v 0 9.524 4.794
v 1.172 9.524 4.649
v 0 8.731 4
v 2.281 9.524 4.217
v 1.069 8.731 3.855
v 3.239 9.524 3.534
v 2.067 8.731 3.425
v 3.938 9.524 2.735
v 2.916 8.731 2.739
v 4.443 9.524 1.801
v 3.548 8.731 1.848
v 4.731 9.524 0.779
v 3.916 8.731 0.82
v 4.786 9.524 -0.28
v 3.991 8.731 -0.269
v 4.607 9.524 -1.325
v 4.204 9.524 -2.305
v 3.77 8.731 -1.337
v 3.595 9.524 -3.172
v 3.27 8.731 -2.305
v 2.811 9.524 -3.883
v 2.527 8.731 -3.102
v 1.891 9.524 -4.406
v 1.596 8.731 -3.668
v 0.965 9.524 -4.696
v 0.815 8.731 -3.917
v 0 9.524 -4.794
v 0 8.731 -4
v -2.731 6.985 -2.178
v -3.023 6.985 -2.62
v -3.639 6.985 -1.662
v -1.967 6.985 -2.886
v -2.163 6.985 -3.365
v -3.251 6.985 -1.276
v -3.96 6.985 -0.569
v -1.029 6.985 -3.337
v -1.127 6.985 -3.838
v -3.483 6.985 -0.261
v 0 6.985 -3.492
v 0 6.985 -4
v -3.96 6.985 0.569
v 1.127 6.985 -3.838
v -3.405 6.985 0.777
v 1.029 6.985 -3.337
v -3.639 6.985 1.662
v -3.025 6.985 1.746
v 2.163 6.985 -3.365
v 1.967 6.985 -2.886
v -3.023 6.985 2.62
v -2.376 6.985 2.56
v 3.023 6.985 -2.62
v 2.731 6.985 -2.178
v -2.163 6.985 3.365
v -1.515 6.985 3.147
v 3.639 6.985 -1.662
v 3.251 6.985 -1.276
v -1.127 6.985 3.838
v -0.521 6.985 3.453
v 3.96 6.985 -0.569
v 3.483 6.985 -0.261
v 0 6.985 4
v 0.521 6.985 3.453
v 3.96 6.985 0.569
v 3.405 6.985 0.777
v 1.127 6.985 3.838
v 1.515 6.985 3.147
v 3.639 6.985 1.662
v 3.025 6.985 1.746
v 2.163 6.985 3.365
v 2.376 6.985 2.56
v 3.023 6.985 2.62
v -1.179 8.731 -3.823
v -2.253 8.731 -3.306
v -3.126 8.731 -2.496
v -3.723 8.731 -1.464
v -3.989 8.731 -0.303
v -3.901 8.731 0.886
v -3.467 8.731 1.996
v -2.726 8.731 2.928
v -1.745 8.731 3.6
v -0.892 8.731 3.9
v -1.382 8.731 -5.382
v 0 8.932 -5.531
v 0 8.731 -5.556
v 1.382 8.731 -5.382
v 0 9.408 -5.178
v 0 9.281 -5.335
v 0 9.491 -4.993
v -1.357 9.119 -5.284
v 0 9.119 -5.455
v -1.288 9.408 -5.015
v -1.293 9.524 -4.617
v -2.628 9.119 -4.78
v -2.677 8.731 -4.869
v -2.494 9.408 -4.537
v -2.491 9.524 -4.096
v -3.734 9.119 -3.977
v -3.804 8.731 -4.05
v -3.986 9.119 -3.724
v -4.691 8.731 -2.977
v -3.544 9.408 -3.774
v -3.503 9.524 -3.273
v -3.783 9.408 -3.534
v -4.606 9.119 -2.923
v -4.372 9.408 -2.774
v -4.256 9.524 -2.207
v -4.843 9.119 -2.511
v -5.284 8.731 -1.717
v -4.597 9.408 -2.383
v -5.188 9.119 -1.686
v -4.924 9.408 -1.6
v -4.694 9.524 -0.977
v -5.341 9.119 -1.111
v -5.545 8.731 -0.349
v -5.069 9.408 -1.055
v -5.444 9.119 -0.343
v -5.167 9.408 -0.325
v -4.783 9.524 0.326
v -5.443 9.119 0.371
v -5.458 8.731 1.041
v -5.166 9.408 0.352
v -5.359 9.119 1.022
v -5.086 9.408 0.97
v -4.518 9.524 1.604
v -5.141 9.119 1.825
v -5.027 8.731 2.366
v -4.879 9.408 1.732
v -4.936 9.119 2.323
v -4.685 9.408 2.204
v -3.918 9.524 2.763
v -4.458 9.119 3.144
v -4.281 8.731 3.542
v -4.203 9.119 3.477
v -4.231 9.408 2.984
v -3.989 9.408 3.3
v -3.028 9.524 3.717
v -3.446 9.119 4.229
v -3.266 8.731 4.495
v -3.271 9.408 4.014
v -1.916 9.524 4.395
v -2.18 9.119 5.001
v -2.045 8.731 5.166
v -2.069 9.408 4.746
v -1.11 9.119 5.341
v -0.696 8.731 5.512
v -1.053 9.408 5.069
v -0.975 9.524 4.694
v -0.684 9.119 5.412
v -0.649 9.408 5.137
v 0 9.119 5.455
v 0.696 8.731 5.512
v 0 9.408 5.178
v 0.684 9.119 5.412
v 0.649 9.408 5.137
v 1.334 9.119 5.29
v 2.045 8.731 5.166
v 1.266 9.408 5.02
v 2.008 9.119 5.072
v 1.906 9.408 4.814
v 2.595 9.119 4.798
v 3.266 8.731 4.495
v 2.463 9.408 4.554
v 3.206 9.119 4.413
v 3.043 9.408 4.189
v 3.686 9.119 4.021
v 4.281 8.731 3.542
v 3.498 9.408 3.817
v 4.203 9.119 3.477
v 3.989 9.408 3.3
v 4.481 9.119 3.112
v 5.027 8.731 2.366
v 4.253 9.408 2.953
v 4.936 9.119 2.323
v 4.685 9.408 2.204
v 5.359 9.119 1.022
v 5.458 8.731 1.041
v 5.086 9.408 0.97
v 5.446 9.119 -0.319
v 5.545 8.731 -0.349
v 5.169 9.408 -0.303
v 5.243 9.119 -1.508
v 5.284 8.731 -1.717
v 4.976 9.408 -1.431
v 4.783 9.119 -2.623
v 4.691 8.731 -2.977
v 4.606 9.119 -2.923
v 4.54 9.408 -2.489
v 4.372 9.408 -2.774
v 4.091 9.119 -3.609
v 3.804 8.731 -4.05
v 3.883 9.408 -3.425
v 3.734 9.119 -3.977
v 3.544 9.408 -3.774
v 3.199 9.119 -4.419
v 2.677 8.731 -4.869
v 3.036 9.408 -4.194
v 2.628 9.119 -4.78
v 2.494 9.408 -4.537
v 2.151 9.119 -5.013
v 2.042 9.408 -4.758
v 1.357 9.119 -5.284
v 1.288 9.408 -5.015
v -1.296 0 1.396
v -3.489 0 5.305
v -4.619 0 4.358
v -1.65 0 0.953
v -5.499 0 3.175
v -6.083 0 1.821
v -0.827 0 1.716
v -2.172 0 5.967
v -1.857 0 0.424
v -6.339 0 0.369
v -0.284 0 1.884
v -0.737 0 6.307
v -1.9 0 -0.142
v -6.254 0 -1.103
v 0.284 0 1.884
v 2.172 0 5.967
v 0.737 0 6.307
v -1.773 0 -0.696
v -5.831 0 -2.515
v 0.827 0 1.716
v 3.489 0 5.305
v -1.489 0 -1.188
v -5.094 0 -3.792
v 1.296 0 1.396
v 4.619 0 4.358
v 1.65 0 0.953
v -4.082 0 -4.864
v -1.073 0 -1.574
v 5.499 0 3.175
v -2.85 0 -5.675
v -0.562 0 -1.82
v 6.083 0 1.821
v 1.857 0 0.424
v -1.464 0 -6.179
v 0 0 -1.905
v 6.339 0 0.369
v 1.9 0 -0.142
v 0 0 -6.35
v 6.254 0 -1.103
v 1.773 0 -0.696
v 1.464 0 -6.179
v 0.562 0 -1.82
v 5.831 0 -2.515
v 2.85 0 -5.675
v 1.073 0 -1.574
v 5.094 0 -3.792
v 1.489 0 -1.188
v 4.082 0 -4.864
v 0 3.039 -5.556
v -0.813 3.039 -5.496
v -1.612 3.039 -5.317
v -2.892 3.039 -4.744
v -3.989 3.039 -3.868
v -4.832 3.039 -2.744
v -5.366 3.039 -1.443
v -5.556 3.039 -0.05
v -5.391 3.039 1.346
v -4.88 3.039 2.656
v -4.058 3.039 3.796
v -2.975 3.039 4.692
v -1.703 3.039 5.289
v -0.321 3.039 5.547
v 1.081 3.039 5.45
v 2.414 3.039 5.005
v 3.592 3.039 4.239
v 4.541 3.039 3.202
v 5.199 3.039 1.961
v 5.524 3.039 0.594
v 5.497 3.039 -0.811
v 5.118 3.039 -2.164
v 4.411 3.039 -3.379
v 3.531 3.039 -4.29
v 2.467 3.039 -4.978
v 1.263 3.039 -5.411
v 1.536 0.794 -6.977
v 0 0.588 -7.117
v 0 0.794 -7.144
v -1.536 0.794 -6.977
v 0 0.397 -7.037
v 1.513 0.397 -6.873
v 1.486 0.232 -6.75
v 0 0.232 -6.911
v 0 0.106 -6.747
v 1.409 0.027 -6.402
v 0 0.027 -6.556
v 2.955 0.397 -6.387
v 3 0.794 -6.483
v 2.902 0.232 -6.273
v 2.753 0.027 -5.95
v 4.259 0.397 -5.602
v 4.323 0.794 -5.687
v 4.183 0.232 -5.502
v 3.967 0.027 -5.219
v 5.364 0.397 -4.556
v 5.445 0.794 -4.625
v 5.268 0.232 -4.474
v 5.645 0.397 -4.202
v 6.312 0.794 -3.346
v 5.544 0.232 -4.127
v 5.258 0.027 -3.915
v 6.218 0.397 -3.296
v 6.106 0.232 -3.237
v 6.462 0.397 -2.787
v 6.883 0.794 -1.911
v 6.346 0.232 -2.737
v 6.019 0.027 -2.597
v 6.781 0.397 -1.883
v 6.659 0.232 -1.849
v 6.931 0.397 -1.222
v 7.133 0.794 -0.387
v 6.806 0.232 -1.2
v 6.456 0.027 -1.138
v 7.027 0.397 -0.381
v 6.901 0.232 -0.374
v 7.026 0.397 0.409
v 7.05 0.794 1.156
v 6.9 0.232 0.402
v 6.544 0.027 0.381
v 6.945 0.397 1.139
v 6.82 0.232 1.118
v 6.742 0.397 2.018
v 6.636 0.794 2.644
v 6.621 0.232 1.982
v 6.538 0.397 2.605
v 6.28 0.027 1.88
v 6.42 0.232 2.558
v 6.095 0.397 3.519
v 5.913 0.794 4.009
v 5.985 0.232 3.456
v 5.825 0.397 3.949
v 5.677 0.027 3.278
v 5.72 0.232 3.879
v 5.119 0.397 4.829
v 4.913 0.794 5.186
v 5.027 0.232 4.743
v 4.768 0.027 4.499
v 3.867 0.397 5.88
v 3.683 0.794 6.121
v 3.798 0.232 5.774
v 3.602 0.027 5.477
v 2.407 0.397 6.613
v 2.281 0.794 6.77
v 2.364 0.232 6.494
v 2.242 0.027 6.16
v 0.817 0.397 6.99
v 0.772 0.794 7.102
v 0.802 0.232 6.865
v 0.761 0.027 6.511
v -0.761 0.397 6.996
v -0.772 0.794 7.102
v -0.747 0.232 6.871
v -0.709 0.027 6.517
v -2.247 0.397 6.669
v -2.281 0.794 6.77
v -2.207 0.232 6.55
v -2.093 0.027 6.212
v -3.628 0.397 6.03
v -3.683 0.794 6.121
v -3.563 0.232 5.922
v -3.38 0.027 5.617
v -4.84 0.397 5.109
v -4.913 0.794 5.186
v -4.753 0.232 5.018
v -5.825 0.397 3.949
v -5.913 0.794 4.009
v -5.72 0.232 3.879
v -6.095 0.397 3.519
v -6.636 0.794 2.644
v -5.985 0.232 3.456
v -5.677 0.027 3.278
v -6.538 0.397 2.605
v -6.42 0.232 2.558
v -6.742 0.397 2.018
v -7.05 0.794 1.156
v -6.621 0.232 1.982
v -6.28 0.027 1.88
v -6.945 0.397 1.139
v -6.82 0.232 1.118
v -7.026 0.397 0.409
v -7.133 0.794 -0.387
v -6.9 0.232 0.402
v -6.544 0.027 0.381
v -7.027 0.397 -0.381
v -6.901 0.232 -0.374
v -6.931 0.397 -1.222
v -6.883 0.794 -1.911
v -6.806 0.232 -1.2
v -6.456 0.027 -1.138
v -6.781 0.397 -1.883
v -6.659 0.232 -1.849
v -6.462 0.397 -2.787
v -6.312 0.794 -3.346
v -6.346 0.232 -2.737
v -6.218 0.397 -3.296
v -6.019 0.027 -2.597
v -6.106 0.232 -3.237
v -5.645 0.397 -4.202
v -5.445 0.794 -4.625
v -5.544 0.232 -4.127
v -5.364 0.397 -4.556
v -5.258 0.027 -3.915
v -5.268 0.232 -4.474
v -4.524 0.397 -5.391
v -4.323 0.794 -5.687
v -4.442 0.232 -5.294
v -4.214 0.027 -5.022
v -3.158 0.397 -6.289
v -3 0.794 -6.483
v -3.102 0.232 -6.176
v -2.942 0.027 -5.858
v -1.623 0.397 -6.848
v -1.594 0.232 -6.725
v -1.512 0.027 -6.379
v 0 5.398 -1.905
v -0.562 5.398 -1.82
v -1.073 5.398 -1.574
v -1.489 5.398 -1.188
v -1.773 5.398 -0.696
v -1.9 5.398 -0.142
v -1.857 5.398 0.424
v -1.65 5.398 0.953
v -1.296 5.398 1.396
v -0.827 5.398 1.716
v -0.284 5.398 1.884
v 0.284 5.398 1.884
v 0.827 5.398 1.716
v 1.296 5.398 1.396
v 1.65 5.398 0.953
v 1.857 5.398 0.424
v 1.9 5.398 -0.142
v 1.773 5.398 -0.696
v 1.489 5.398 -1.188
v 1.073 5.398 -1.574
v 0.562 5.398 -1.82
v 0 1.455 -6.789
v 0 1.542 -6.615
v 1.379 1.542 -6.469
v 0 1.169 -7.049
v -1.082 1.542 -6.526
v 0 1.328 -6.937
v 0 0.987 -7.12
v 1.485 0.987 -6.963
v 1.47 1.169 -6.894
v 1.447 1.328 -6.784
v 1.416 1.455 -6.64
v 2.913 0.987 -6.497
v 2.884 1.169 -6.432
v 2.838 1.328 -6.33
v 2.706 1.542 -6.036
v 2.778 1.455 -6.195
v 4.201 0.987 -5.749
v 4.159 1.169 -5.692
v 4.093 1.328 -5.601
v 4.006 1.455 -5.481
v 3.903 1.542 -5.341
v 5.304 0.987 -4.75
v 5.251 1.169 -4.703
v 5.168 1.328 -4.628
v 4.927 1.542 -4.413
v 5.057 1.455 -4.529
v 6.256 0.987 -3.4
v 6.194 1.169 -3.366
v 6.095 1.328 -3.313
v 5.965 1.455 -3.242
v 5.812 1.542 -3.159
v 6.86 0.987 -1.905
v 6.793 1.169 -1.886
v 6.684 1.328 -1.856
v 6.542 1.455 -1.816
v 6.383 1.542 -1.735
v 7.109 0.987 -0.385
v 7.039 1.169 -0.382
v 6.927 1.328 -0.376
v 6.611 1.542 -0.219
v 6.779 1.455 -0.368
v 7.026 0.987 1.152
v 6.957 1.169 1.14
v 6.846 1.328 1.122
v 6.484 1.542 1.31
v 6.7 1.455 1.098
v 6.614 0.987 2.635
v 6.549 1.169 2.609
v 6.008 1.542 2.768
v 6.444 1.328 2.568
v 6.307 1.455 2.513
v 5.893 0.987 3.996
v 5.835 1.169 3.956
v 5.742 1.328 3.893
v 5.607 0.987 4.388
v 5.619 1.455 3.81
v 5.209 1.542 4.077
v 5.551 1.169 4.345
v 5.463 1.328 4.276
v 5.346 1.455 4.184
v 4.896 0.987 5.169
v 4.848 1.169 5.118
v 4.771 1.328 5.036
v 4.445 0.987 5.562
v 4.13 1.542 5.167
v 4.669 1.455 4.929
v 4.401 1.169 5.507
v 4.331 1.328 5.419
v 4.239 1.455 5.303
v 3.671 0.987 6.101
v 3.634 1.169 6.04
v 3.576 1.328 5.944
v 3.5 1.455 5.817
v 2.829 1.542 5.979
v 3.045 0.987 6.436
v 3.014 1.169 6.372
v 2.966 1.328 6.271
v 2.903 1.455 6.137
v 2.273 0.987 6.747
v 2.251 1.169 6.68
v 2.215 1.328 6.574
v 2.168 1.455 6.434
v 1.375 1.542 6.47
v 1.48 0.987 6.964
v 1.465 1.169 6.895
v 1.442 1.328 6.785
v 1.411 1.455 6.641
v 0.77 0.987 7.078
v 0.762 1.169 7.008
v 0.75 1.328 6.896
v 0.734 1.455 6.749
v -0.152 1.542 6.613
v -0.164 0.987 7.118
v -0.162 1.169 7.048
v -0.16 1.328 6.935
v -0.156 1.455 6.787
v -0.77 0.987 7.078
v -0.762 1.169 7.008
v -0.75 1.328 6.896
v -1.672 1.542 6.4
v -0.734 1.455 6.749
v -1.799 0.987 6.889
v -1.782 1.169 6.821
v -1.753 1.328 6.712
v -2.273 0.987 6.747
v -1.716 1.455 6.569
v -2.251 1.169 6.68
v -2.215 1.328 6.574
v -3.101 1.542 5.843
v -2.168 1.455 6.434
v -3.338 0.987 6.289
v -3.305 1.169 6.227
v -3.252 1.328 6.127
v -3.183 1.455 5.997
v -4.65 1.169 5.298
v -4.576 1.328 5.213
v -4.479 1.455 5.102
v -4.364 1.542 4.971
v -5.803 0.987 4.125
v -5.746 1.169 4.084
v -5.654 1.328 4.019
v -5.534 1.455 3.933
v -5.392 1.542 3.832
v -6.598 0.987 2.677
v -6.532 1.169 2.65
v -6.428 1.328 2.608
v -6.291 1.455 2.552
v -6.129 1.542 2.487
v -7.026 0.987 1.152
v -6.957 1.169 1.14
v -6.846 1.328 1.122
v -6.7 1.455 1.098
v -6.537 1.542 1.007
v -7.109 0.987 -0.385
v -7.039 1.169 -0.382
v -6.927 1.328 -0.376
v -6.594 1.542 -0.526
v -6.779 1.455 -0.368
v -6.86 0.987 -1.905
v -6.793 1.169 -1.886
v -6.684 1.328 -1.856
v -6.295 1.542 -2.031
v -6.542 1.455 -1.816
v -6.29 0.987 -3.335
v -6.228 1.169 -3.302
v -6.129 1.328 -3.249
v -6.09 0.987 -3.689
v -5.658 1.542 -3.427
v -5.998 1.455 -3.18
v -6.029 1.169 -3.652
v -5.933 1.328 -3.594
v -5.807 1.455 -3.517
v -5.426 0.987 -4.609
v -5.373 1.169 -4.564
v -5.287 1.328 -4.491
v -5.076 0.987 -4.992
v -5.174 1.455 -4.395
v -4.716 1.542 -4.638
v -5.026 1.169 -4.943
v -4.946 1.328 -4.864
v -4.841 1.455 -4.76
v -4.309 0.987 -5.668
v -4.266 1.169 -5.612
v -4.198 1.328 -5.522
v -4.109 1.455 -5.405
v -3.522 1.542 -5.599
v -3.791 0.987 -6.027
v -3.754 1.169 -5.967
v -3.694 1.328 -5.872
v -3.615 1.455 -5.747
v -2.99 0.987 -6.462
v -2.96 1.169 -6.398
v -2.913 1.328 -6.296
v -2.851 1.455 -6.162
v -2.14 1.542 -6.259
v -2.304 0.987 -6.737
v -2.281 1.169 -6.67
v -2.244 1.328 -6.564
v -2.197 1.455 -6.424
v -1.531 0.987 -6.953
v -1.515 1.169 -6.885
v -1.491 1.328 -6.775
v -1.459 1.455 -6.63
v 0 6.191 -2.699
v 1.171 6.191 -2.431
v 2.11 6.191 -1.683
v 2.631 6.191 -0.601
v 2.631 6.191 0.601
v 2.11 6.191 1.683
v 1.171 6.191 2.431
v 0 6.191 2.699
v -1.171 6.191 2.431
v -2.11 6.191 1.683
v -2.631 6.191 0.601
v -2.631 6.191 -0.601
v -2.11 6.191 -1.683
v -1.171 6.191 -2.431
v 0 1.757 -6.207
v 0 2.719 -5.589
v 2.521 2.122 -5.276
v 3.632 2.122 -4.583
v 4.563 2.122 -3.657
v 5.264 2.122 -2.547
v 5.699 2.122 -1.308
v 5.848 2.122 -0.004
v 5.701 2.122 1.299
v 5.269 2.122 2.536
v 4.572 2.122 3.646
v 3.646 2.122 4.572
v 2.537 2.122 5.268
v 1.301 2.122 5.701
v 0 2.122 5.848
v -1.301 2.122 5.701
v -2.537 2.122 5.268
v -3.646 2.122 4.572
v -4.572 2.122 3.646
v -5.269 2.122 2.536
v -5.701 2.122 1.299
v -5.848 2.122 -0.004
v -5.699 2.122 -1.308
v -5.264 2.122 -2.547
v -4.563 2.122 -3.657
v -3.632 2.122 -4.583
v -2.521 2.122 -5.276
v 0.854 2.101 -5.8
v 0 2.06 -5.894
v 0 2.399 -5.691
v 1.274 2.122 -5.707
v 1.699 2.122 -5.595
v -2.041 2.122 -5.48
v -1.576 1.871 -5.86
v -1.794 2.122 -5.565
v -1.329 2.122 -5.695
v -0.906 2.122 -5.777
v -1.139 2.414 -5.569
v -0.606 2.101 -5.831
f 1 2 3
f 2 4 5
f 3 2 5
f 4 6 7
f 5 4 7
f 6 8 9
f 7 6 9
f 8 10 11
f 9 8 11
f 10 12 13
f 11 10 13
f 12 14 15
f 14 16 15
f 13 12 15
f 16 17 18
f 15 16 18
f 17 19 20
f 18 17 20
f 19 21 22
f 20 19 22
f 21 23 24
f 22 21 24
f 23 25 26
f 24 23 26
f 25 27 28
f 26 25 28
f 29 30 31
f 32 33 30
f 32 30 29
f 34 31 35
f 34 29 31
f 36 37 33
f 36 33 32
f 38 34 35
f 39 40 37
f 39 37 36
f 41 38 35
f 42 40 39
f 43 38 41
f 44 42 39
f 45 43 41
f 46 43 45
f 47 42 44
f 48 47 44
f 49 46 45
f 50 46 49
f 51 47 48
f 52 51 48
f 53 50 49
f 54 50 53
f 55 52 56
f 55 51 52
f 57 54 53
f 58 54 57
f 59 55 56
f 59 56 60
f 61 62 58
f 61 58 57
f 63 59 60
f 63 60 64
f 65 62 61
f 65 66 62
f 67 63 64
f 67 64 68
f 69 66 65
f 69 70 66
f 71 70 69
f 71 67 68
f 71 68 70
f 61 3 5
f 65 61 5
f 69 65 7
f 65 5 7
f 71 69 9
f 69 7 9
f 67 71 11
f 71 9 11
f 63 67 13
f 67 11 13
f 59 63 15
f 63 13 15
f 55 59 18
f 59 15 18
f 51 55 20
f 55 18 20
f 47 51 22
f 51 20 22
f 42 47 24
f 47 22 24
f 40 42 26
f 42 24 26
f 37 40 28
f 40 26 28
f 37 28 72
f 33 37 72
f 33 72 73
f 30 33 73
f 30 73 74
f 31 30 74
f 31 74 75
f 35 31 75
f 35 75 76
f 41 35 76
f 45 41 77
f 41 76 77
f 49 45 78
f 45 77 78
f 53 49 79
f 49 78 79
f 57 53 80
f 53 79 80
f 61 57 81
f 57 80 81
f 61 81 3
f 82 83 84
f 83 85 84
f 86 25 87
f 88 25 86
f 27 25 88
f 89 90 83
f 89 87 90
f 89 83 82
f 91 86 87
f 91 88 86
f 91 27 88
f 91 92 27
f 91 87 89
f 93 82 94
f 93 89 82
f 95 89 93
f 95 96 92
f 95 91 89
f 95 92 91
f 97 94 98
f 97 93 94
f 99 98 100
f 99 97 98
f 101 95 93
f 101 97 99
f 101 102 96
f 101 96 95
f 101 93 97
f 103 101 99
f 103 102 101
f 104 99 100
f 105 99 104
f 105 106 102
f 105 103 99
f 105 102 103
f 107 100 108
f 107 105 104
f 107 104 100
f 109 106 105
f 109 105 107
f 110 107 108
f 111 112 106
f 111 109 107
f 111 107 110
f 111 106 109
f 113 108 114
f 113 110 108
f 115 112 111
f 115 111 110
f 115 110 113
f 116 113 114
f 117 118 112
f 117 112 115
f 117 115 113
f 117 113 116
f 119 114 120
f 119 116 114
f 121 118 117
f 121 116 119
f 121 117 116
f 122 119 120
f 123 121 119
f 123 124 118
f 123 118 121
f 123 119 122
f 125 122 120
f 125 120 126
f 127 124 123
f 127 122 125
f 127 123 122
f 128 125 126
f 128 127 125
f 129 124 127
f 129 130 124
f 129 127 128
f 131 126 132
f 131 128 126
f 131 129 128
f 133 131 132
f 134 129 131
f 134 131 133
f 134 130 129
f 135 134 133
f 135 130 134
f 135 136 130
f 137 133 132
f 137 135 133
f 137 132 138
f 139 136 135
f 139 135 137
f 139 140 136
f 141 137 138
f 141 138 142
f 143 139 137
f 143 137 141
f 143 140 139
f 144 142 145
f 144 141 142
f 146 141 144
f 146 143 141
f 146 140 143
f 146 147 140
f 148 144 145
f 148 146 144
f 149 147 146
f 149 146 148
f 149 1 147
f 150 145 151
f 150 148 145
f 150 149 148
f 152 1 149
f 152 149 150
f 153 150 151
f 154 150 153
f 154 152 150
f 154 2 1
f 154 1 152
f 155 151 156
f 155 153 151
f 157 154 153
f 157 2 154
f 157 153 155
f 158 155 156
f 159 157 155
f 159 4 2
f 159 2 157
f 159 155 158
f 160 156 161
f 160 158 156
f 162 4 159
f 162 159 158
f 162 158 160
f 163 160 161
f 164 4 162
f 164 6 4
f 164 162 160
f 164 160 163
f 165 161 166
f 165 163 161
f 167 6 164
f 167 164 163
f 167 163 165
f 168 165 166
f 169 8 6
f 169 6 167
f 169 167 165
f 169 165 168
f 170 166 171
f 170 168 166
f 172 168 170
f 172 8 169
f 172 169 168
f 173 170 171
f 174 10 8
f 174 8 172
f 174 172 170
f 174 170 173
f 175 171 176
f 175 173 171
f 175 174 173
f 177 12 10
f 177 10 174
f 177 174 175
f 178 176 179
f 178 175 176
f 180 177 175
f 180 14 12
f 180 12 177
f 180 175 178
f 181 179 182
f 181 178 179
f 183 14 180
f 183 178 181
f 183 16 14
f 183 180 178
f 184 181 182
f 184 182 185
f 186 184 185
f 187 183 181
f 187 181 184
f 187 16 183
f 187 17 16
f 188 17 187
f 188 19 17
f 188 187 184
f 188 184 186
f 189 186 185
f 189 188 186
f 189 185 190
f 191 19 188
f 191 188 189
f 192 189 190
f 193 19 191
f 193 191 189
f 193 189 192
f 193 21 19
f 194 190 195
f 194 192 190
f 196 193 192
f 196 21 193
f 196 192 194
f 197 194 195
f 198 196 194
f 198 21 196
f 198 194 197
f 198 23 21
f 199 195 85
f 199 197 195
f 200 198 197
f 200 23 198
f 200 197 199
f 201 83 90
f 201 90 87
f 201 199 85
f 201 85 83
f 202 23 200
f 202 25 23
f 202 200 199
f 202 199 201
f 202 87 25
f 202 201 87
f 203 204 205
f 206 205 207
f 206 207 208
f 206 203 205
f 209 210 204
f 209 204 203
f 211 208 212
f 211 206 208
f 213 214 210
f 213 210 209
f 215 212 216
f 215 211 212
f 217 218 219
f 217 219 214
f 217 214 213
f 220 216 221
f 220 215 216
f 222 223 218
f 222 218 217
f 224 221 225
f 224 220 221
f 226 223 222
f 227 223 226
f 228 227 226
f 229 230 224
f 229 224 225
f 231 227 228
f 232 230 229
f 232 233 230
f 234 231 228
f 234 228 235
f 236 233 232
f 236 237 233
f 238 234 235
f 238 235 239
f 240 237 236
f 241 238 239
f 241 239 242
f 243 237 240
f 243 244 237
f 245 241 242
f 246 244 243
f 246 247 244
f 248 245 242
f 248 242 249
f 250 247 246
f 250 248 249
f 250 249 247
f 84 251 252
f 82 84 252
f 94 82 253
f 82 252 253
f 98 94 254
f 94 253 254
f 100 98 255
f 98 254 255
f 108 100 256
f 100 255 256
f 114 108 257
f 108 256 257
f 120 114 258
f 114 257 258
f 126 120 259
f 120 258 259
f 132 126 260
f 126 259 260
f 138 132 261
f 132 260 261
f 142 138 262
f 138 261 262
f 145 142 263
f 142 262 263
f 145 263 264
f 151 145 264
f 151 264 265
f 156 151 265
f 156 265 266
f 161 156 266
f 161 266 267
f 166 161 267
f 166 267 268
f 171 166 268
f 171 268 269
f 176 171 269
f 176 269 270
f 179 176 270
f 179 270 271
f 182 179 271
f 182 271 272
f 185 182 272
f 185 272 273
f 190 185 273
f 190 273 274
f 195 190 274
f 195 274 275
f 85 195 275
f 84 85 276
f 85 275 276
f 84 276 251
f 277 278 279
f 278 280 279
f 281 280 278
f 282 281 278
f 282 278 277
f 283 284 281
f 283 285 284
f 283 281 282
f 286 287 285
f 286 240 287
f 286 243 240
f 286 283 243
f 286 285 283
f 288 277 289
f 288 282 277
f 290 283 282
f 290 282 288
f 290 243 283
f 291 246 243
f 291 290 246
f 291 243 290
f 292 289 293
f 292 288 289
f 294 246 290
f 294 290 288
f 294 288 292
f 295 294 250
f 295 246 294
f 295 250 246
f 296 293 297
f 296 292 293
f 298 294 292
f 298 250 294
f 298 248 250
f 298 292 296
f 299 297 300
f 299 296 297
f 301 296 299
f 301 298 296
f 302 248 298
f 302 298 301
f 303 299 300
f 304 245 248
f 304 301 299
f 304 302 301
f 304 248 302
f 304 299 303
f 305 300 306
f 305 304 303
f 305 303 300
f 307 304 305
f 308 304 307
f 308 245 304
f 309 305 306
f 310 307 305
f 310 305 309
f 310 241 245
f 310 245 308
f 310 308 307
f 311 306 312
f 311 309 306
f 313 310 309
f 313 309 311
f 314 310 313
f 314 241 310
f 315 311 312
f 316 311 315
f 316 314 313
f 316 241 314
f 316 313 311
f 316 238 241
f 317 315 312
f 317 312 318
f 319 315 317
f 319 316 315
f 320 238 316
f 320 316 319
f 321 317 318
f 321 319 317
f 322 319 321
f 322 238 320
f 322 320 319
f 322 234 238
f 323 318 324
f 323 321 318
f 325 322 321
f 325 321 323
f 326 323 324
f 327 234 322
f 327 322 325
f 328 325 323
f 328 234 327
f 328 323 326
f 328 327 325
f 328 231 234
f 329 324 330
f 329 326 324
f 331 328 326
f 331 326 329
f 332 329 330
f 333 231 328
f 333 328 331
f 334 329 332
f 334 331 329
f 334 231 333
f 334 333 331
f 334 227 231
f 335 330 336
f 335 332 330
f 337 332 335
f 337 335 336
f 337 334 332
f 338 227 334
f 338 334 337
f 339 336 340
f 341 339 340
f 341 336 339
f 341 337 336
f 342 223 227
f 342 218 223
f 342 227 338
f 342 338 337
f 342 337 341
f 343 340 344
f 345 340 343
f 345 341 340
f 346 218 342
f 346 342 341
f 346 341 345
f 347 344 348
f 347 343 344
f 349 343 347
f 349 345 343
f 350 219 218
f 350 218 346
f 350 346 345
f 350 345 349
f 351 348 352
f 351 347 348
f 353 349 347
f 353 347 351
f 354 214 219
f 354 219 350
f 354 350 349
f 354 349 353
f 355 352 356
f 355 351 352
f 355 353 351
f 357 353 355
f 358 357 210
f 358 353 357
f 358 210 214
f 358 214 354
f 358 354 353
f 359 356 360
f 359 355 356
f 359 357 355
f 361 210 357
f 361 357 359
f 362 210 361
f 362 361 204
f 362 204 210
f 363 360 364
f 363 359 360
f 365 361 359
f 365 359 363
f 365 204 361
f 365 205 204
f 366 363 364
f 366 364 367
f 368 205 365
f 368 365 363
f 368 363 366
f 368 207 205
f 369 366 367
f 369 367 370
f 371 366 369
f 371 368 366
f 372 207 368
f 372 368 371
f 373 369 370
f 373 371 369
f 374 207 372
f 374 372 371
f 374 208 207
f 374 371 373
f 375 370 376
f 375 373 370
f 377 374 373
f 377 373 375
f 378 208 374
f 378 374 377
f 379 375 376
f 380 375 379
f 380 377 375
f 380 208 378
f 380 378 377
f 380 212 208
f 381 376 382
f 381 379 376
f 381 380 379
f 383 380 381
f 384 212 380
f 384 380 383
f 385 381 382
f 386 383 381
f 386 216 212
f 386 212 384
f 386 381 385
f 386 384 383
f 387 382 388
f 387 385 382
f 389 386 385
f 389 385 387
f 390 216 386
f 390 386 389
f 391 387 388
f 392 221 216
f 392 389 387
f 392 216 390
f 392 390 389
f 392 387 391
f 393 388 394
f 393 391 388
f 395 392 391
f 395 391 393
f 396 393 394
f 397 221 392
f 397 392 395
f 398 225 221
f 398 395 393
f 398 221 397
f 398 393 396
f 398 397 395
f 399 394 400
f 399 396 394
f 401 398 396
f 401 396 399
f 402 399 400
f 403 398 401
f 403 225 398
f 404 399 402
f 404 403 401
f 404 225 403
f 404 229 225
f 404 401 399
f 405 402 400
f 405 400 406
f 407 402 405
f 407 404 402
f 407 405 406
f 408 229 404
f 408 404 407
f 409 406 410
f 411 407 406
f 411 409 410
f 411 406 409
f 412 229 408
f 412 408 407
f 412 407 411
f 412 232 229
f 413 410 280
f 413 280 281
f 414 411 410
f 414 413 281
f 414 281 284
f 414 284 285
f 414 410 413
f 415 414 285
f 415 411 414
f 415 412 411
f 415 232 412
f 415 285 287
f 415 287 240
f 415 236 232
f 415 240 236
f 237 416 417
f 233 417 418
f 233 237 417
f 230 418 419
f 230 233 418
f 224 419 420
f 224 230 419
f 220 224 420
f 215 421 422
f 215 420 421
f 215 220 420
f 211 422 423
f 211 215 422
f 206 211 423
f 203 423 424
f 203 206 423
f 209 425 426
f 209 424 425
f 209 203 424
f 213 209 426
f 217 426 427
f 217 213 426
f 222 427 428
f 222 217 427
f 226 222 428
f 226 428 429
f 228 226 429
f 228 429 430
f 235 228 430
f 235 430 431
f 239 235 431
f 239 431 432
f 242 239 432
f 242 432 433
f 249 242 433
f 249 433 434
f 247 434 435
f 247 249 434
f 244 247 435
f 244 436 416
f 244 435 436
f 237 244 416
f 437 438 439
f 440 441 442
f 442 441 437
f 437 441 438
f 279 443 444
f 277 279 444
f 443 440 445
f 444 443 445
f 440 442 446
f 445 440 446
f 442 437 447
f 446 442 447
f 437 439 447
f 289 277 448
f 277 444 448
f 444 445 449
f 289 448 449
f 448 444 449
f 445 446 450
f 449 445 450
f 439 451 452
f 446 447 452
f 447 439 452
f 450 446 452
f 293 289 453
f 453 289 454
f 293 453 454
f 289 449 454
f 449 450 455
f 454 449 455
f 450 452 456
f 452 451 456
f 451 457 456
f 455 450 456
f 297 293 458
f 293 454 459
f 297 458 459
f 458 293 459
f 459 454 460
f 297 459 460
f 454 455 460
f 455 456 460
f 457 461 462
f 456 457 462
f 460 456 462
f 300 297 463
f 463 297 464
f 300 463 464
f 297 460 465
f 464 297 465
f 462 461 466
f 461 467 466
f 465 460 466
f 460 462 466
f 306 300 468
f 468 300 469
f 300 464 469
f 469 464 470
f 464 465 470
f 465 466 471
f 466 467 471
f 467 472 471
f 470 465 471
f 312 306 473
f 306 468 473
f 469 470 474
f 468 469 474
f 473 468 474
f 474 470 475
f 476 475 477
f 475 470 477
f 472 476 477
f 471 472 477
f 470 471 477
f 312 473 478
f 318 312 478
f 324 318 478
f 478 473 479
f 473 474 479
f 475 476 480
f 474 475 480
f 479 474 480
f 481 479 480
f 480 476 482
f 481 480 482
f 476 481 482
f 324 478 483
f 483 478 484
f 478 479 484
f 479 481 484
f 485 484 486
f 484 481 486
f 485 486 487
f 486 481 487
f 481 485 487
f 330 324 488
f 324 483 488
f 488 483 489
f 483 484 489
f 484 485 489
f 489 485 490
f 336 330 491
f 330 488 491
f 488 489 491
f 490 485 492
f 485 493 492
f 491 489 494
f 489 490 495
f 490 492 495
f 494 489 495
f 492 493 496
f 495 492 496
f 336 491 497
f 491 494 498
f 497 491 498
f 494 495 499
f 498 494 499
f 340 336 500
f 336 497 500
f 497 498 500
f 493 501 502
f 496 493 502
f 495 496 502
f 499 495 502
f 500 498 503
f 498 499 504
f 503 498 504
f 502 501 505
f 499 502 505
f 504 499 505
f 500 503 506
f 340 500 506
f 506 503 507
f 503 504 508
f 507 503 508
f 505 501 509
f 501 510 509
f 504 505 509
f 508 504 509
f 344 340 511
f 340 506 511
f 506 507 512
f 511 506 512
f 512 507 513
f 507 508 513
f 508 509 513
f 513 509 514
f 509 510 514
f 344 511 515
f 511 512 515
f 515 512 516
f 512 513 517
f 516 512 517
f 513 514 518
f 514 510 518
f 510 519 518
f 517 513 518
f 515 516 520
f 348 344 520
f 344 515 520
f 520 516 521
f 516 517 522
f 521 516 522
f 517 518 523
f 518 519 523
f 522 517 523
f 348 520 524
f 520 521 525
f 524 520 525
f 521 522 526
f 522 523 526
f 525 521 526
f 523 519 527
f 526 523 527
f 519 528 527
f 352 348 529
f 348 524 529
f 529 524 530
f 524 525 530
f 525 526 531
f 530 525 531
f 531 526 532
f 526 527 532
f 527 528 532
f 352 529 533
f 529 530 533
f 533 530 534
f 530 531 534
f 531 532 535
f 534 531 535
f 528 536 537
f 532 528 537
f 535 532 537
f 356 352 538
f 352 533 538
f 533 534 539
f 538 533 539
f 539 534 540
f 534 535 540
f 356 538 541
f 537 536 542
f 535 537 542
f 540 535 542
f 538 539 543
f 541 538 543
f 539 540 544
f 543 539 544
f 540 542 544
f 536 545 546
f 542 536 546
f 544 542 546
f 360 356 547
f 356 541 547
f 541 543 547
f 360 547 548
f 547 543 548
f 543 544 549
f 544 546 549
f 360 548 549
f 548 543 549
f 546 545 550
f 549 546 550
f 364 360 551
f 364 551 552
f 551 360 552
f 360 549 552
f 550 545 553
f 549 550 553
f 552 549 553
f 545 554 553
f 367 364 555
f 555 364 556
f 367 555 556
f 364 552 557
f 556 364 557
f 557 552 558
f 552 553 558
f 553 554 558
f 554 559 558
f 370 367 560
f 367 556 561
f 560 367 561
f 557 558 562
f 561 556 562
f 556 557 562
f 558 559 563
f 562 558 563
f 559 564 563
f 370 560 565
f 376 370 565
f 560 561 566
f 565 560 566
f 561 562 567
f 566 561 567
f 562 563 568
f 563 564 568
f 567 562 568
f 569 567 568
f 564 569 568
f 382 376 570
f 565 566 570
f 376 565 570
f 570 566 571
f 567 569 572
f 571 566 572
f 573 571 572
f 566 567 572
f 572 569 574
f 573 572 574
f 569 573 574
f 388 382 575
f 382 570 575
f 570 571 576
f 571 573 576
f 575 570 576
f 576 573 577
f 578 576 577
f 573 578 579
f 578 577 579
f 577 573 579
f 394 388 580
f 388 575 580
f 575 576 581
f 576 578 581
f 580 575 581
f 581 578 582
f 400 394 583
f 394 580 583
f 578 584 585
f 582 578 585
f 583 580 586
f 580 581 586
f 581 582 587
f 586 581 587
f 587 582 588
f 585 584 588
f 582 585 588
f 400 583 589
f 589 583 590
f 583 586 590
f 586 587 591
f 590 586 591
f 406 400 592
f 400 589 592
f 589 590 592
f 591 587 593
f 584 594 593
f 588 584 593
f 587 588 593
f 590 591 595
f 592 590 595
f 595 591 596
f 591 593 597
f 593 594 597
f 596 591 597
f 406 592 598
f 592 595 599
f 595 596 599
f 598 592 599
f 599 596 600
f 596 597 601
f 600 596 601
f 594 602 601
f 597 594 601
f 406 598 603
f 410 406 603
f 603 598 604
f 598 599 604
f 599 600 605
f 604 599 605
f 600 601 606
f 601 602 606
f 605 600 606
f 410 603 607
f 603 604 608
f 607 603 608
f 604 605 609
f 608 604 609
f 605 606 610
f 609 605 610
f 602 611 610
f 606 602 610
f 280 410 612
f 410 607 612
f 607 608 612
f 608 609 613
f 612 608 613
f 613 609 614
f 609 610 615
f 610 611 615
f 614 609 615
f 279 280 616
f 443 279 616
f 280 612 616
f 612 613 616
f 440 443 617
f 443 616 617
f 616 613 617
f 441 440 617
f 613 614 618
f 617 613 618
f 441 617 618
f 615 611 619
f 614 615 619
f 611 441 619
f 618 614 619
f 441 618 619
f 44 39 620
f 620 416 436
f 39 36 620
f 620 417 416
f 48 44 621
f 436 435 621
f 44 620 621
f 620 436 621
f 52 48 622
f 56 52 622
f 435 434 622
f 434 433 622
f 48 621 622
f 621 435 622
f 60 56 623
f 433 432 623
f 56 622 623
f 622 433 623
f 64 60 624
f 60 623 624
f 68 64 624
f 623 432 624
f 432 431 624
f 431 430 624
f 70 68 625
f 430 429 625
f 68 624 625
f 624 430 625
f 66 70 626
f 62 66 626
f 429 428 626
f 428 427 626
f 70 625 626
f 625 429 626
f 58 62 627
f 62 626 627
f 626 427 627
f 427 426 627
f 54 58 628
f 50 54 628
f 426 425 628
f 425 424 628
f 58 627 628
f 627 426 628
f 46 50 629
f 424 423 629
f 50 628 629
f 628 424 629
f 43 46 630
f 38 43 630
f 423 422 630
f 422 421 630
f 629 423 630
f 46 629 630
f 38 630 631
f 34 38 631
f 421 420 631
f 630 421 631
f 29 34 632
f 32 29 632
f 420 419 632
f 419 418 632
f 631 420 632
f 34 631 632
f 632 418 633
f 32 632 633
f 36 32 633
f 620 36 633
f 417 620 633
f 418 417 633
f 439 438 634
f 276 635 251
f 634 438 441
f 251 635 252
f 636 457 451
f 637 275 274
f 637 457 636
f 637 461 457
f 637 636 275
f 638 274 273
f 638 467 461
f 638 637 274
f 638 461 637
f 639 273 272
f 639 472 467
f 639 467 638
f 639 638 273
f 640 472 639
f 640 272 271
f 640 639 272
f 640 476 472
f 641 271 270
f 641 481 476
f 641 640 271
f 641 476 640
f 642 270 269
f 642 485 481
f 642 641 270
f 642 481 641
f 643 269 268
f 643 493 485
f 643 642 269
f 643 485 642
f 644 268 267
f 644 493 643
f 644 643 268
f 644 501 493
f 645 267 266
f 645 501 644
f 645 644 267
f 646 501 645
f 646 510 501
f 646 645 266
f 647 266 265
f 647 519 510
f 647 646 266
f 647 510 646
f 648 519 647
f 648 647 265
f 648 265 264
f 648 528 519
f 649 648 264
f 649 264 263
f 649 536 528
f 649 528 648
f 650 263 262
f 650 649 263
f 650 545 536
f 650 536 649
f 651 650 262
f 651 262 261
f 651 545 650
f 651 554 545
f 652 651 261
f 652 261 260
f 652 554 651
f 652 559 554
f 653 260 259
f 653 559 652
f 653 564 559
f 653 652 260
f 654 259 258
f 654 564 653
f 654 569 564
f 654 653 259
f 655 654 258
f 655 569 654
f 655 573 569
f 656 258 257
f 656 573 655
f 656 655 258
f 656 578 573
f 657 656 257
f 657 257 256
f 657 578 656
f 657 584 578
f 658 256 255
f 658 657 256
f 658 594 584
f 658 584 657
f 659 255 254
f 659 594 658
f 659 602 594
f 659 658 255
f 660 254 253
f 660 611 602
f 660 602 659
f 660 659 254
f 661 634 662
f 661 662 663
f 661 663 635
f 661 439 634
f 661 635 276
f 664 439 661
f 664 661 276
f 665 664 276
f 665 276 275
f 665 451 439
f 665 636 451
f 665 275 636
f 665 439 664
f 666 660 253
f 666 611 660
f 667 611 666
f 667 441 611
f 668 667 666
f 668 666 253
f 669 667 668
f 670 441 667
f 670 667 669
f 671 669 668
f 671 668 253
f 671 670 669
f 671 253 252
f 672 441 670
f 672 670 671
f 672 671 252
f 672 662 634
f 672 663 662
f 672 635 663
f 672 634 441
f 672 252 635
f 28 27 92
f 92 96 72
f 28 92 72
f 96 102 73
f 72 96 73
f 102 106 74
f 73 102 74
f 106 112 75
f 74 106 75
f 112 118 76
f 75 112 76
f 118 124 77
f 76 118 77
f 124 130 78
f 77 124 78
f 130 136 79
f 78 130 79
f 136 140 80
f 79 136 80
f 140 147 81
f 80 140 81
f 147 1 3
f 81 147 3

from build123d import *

# Parameters (mm, degrees)
SKETCH4_R           = 5.55625
SKETCH4_R_2         = 1.905
BOSS_EXTRUDE3_DEPTH = 9.525
SKETCH5_R           = 7.14375
SKETCH5_R_2         = 1.905
BOSS_EXTRUDE4_DEPTH = 1.5875
FILLET4_R           = 0.79375
FILLET5_R           = 1.5875
SKETCH6_R           = 4.0005
CUT_EXTRUDE1_DEPTH  = 2.54
CHAMFER1_SIZE       = 0.79375
CHAMFER2_SIZE       = 1.5875


with BuildPart() as part:
    # Sketch4 → Boss-Extrude3 (new body)
    with BuildSketch(Plane(origin=(0, 0, 0), x_dir=(1, 0, 0), z_dir=(0, 1, 0))):
        with Locations(Location((0, 0, 0), (0, 0, 90))):
            Circle(SKETCH4_R)
        with Locations(Location((0, 0, 0), (0, 0, 90))):
            Circle(SKETCH4_R_2, mode=Mode.SUBTRACT)
    extrude(amount=BOSS_EXTRUDE3_DEPTH)

    # Sketch5 → Boss-Extrude4 (add)
    with BuildSketch(Plane(origin=(0, 0, 0), x_dir=(-1, 0, 0), z_dir=(0, -1, 0))):
        with Locations(Location((0, 0, 0), (0, 0, 90))):
            Circle(SKETCH5_R)
        with Locations(Location((0, 0, 0), (0, 0, 90))):
            Circle(SKETCH5_R_2, mode=Mode.SUBTRACT)
    extrude(amount=-BOSS_EXTRUDE4_DEPTH)

    # Fillet4
    fillet4_edges = [part.edges().sort_by_distance(p)[0] for p in [
        (0, 0, 7.14375),
        (0, 1.5875, 7.14375),
        (0, 9.525, 5.55625),
    ]]
    fillet(fillet4_edges, radius=FILLET4_R - 0.0001)  # a hair under: the kernel refuses the full size

    # Fillet5
    fillet5_edges = [part.edges().sort_by_distance(p)[0] for p in [
        (0, 1.5875, 5.55625),
    ]]
    fillet(fillet5_edges, radius=FILLET5_R)

    # Sketch6 → Cut-Extrude1 (cut)
    with BuildSketch(Plane(origin=(0, 9.525, 0), x_dir=(1, 0, 0), z_dir=(0, 1, 0))):
        with Locations(Location((0, 0, 0), (0, 0, 270))):
            Circle(SKETCH6_R)
    extrude(amount=-CUT_EXTRUDE1_DEPTH, mode=Mode.SUBTRACT)

    # Chamfer1
    chamfer1_edges = [part.edges().sort_by_distance(p)[0] for p in [
        (0, 9.525, -4.0005),
    ]]
    chamfer(chamfer1_edges, length=CHAMFER1_SIZE)

    # Chamfer2
    chamfer2_edges = [part.edges().sort_by_distance(p)[0] for p in [
        (0, 6.985, 1.905),
    ]]
    chamfer(chamfer2_edges, length=CHAMFER2_SIZE)


solid = part.part
